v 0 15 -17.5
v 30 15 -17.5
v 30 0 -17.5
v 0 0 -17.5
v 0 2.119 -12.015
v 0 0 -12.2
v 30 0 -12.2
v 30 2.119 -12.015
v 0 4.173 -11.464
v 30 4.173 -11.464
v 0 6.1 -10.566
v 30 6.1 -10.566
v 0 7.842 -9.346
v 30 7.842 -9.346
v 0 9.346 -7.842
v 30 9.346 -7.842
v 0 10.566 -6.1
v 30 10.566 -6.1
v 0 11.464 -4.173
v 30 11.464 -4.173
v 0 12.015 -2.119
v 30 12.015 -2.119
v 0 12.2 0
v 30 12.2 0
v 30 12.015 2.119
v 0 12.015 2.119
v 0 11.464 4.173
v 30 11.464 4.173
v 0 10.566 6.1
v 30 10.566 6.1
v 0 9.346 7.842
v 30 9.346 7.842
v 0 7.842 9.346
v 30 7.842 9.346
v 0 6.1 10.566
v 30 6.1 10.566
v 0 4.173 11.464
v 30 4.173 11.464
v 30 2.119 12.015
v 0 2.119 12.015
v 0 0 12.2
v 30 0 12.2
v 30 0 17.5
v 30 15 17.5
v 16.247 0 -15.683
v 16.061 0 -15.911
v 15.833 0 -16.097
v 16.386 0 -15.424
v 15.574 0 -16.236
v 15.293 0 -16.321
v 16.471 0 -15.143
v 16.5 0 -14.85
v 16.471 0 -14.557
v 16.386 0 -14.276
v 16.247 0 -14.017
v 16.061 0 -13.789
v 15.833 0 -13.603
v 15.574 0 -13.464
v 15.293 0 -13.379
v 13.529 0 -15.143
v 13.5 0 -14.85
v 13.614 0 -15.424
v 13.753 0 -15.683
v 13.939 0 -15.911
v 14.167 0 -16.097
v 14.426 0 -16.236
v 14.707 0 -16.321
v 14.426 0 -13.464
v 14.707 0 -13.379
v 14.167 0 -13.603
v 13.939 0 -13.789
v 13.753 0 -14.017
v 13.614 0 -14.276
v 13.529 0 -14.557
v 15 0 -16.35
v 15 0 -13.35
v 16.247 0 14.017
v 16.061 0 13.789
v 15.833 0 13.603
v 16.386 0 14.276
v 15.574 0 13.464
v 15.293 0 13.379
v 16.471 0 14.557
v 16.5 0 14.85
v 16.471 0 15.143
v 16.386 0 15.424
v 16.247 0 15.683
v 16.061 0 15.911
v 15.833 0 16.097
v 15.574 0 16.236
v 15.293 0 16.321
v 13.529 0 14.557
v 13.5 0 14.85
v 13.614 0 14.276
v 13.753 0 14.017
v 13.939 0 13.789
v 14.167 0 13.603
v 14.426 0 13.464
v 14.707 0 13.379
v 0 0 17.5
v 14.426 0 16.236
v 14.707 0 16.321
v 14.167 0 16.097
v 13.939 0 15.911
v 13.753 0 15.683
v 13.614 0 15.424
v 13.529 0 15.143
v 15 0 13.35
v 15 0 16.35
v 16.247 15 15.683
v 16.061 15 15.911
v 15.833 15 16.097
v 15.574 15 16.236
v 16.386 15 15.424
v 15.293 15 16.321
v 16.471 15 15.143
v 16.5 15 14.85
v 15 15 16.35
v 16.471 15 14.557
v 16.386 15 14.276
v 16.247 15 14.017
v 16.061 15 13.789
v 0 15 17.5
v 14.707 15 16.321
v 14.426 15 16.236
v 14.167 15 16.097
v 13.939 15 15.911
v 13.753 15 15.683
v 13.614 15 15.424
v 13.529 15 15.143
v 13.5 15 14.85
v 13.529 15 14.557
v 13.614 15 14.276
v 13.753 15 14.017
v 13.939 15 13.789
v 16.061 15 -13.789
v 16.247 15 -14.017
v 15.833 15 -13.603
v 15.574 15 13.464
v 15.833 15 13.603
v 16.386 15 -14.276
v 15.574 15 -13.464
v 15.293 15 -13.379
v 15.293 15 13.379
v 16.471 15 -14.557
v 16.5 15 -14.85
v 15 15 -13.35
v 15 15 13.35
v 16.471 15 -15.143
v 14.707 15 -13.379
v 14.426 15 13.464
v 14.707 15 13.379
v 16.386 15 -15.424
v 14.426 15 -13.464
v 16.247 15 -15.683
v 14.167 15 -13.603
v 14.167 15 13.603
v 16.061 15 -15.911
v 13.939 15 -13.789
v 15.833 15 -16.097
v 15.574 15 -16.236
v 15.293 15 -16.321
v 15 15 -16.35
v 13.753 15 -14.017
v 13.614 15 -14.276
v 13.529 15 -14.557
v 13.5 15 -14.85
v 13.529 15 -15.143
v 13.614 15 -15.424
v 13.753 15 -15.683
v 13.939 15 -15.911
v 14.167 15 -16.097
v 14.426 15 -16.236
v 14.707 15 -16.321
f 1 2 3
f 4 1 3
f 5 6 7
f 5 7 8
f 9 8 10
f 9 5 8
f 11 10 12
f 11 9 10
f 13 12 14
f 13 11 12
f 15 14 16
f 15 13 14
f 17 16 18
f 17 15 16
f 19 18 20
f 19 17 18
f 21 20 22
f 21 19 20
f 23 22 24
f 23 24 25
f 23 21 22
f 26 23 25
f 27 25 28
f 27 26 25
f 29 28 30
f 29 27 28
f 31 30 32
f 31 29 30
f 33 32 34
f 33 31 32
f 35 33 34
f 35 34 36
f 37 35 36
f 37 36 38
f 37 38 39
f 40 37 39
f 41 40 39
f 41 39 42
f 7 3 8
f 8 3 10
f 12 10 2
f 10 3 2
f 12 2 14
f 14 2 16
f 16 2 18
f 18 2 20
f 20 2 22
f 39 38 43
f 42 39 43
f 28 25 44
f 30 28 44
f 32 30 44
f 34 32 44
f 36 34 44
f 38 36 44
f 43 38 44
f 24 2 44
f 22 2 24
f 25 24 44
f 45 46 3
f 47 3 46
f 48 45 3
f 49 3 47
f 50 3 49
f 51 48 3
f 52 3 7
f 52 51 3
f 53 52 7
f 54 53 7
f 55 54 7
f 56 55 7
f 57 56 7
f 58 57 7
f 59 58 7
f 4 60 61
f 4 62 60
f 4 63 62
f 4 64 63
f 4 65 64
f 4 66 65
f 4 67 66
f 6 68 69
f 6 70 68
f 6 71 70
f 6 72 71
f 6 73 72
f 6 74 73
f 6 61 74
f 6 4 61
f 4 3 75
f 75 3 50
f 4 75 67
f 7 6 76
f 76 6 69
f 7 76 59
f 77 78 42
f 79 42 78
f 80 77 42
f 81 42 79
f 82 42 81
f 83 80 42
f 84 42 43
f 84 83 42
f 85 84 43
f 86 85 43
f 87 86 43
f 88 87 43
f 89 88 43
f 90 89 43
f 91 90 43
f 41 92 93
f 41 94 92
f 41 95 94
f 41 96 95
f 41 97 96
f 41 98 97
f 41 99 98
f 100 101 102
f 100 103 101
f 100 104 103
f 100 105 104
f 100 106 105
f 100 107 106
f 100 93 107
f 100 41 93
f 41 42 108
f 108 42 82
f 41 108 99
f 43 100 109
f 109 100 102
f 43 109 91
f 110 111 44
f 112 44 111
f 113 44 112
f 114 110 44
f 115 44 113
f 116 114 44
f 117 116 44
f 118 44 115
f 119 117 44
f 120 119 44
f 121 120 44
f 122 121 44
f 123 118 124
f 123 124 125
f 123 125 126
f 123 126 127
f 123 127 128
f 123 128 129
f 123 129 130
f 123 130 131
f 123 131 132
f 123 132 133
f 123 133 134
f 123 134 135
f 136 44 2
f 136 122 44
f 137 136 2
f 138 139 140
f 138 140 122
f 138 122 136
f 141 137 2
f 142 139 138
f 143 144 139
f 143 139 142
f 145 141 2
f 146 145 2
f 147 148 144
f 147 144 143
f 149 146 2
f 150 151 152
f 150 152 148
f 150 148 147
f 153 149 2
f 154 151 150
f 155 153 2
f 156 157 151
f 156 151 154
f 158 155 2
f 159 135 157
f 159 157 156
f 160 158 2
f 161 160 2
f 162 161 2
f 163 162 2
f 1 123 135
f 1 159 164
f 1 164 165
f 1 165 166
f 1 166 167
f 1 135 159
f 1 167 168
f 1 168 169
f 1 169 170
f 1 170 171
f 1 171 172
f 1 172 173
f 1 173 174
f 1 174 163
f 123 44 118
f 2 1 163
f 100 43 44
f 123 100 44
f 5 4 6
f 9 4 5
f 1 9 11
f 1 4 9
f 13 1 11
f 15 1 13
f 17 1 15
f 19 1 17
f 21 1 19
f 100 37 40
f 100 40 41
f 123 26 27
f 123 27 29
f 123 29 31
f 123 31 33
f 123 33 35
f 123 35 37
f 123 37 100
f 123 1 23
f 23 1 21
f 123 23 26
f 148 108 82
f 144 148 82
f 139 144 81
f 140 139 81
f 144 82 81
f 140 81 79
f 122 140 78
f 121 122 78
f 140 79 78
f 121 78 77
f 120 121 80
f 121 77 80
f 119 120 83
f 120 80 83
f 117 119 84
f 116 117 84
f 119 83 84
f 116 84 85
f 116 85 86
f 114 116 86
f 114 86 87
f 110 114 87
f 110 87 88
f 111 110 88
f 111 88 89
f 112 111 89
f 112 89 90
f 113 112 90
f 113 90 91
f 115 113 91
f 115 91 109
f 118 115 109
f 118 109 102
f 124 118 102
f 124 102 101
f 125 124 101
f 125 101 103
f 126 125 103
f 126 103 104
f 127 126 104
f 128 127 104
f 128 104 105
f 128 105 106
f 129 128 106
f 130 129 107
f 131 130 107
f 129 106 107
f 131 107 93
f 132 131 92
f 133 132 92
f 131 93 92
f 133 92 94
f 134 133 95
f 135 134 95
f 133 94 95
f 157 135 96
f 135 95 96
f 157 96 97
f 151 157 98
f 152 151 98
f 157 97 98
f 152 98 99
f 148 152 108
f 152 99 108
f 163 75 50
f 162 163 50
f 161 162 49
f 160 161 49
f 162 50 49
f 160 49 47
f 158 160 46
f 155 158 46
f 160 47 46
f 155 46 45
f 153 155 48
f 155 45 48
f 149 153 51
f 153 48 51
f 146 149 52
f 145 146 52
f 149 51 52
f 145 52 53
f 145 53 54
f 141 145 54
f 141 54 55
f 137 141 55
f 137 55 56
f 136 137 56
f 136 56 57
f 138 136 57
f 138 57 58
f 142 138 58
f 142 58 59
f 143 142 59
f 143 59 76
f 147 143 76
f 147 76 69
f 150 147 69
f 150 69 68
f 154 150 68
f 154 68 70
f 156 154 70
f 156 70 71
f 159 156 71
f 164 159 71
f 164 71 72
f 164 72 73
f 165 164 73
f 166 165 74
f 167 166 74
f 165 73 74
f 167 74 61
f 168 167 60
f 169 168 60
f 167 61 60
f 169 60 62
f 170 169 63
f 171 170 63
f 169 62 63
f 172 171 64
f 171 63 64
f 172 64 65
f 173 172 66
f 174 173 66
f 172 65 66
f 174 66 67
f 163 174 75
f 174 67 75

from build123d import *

# Parameters (mm, degrees)
BOSS_EXTRUDE1_DEPTH   = 30
F_3_0MM_DOWEL_HOLE1_D = 3


with BuildPart() as part:
    # Sketch1 → Boss-Extrude1 (new body)
    with BuildSketch(Plane(origin=(0, 0, 0), x_dir=(0, 0, -1), z_dir=(1, 0, 0))):
        with BuildLine():
            Line((-17.5, 0), (-17.5, 15))
            Line((-17.5, 15), (17.5, 15))
            Line((17.5, 15), (17.5, 0))
            Line((17.5, 0), (12.2, 0))
            ThreePointArc((12.2, 0), (0, 12.2), (-12.2, 0))
            Line((-12.2, 0), (-17.5, 0))
        make_face()
    extrude(amount=BOSS_EXTRUDE1_DEPTH)

    # Ø3.0mm Dowel Hole1 (through all)
    with Locations(Plane(origin=(15, 15, -14.85), x_dir=(0, 0, 1), z_dir=(0, 1, 0))):
        with Locations((0, 0), (29.7, 0)):
            Hole(F_3_0MM_DOWEL_HOLE1_D / 2)


solid = part.part
